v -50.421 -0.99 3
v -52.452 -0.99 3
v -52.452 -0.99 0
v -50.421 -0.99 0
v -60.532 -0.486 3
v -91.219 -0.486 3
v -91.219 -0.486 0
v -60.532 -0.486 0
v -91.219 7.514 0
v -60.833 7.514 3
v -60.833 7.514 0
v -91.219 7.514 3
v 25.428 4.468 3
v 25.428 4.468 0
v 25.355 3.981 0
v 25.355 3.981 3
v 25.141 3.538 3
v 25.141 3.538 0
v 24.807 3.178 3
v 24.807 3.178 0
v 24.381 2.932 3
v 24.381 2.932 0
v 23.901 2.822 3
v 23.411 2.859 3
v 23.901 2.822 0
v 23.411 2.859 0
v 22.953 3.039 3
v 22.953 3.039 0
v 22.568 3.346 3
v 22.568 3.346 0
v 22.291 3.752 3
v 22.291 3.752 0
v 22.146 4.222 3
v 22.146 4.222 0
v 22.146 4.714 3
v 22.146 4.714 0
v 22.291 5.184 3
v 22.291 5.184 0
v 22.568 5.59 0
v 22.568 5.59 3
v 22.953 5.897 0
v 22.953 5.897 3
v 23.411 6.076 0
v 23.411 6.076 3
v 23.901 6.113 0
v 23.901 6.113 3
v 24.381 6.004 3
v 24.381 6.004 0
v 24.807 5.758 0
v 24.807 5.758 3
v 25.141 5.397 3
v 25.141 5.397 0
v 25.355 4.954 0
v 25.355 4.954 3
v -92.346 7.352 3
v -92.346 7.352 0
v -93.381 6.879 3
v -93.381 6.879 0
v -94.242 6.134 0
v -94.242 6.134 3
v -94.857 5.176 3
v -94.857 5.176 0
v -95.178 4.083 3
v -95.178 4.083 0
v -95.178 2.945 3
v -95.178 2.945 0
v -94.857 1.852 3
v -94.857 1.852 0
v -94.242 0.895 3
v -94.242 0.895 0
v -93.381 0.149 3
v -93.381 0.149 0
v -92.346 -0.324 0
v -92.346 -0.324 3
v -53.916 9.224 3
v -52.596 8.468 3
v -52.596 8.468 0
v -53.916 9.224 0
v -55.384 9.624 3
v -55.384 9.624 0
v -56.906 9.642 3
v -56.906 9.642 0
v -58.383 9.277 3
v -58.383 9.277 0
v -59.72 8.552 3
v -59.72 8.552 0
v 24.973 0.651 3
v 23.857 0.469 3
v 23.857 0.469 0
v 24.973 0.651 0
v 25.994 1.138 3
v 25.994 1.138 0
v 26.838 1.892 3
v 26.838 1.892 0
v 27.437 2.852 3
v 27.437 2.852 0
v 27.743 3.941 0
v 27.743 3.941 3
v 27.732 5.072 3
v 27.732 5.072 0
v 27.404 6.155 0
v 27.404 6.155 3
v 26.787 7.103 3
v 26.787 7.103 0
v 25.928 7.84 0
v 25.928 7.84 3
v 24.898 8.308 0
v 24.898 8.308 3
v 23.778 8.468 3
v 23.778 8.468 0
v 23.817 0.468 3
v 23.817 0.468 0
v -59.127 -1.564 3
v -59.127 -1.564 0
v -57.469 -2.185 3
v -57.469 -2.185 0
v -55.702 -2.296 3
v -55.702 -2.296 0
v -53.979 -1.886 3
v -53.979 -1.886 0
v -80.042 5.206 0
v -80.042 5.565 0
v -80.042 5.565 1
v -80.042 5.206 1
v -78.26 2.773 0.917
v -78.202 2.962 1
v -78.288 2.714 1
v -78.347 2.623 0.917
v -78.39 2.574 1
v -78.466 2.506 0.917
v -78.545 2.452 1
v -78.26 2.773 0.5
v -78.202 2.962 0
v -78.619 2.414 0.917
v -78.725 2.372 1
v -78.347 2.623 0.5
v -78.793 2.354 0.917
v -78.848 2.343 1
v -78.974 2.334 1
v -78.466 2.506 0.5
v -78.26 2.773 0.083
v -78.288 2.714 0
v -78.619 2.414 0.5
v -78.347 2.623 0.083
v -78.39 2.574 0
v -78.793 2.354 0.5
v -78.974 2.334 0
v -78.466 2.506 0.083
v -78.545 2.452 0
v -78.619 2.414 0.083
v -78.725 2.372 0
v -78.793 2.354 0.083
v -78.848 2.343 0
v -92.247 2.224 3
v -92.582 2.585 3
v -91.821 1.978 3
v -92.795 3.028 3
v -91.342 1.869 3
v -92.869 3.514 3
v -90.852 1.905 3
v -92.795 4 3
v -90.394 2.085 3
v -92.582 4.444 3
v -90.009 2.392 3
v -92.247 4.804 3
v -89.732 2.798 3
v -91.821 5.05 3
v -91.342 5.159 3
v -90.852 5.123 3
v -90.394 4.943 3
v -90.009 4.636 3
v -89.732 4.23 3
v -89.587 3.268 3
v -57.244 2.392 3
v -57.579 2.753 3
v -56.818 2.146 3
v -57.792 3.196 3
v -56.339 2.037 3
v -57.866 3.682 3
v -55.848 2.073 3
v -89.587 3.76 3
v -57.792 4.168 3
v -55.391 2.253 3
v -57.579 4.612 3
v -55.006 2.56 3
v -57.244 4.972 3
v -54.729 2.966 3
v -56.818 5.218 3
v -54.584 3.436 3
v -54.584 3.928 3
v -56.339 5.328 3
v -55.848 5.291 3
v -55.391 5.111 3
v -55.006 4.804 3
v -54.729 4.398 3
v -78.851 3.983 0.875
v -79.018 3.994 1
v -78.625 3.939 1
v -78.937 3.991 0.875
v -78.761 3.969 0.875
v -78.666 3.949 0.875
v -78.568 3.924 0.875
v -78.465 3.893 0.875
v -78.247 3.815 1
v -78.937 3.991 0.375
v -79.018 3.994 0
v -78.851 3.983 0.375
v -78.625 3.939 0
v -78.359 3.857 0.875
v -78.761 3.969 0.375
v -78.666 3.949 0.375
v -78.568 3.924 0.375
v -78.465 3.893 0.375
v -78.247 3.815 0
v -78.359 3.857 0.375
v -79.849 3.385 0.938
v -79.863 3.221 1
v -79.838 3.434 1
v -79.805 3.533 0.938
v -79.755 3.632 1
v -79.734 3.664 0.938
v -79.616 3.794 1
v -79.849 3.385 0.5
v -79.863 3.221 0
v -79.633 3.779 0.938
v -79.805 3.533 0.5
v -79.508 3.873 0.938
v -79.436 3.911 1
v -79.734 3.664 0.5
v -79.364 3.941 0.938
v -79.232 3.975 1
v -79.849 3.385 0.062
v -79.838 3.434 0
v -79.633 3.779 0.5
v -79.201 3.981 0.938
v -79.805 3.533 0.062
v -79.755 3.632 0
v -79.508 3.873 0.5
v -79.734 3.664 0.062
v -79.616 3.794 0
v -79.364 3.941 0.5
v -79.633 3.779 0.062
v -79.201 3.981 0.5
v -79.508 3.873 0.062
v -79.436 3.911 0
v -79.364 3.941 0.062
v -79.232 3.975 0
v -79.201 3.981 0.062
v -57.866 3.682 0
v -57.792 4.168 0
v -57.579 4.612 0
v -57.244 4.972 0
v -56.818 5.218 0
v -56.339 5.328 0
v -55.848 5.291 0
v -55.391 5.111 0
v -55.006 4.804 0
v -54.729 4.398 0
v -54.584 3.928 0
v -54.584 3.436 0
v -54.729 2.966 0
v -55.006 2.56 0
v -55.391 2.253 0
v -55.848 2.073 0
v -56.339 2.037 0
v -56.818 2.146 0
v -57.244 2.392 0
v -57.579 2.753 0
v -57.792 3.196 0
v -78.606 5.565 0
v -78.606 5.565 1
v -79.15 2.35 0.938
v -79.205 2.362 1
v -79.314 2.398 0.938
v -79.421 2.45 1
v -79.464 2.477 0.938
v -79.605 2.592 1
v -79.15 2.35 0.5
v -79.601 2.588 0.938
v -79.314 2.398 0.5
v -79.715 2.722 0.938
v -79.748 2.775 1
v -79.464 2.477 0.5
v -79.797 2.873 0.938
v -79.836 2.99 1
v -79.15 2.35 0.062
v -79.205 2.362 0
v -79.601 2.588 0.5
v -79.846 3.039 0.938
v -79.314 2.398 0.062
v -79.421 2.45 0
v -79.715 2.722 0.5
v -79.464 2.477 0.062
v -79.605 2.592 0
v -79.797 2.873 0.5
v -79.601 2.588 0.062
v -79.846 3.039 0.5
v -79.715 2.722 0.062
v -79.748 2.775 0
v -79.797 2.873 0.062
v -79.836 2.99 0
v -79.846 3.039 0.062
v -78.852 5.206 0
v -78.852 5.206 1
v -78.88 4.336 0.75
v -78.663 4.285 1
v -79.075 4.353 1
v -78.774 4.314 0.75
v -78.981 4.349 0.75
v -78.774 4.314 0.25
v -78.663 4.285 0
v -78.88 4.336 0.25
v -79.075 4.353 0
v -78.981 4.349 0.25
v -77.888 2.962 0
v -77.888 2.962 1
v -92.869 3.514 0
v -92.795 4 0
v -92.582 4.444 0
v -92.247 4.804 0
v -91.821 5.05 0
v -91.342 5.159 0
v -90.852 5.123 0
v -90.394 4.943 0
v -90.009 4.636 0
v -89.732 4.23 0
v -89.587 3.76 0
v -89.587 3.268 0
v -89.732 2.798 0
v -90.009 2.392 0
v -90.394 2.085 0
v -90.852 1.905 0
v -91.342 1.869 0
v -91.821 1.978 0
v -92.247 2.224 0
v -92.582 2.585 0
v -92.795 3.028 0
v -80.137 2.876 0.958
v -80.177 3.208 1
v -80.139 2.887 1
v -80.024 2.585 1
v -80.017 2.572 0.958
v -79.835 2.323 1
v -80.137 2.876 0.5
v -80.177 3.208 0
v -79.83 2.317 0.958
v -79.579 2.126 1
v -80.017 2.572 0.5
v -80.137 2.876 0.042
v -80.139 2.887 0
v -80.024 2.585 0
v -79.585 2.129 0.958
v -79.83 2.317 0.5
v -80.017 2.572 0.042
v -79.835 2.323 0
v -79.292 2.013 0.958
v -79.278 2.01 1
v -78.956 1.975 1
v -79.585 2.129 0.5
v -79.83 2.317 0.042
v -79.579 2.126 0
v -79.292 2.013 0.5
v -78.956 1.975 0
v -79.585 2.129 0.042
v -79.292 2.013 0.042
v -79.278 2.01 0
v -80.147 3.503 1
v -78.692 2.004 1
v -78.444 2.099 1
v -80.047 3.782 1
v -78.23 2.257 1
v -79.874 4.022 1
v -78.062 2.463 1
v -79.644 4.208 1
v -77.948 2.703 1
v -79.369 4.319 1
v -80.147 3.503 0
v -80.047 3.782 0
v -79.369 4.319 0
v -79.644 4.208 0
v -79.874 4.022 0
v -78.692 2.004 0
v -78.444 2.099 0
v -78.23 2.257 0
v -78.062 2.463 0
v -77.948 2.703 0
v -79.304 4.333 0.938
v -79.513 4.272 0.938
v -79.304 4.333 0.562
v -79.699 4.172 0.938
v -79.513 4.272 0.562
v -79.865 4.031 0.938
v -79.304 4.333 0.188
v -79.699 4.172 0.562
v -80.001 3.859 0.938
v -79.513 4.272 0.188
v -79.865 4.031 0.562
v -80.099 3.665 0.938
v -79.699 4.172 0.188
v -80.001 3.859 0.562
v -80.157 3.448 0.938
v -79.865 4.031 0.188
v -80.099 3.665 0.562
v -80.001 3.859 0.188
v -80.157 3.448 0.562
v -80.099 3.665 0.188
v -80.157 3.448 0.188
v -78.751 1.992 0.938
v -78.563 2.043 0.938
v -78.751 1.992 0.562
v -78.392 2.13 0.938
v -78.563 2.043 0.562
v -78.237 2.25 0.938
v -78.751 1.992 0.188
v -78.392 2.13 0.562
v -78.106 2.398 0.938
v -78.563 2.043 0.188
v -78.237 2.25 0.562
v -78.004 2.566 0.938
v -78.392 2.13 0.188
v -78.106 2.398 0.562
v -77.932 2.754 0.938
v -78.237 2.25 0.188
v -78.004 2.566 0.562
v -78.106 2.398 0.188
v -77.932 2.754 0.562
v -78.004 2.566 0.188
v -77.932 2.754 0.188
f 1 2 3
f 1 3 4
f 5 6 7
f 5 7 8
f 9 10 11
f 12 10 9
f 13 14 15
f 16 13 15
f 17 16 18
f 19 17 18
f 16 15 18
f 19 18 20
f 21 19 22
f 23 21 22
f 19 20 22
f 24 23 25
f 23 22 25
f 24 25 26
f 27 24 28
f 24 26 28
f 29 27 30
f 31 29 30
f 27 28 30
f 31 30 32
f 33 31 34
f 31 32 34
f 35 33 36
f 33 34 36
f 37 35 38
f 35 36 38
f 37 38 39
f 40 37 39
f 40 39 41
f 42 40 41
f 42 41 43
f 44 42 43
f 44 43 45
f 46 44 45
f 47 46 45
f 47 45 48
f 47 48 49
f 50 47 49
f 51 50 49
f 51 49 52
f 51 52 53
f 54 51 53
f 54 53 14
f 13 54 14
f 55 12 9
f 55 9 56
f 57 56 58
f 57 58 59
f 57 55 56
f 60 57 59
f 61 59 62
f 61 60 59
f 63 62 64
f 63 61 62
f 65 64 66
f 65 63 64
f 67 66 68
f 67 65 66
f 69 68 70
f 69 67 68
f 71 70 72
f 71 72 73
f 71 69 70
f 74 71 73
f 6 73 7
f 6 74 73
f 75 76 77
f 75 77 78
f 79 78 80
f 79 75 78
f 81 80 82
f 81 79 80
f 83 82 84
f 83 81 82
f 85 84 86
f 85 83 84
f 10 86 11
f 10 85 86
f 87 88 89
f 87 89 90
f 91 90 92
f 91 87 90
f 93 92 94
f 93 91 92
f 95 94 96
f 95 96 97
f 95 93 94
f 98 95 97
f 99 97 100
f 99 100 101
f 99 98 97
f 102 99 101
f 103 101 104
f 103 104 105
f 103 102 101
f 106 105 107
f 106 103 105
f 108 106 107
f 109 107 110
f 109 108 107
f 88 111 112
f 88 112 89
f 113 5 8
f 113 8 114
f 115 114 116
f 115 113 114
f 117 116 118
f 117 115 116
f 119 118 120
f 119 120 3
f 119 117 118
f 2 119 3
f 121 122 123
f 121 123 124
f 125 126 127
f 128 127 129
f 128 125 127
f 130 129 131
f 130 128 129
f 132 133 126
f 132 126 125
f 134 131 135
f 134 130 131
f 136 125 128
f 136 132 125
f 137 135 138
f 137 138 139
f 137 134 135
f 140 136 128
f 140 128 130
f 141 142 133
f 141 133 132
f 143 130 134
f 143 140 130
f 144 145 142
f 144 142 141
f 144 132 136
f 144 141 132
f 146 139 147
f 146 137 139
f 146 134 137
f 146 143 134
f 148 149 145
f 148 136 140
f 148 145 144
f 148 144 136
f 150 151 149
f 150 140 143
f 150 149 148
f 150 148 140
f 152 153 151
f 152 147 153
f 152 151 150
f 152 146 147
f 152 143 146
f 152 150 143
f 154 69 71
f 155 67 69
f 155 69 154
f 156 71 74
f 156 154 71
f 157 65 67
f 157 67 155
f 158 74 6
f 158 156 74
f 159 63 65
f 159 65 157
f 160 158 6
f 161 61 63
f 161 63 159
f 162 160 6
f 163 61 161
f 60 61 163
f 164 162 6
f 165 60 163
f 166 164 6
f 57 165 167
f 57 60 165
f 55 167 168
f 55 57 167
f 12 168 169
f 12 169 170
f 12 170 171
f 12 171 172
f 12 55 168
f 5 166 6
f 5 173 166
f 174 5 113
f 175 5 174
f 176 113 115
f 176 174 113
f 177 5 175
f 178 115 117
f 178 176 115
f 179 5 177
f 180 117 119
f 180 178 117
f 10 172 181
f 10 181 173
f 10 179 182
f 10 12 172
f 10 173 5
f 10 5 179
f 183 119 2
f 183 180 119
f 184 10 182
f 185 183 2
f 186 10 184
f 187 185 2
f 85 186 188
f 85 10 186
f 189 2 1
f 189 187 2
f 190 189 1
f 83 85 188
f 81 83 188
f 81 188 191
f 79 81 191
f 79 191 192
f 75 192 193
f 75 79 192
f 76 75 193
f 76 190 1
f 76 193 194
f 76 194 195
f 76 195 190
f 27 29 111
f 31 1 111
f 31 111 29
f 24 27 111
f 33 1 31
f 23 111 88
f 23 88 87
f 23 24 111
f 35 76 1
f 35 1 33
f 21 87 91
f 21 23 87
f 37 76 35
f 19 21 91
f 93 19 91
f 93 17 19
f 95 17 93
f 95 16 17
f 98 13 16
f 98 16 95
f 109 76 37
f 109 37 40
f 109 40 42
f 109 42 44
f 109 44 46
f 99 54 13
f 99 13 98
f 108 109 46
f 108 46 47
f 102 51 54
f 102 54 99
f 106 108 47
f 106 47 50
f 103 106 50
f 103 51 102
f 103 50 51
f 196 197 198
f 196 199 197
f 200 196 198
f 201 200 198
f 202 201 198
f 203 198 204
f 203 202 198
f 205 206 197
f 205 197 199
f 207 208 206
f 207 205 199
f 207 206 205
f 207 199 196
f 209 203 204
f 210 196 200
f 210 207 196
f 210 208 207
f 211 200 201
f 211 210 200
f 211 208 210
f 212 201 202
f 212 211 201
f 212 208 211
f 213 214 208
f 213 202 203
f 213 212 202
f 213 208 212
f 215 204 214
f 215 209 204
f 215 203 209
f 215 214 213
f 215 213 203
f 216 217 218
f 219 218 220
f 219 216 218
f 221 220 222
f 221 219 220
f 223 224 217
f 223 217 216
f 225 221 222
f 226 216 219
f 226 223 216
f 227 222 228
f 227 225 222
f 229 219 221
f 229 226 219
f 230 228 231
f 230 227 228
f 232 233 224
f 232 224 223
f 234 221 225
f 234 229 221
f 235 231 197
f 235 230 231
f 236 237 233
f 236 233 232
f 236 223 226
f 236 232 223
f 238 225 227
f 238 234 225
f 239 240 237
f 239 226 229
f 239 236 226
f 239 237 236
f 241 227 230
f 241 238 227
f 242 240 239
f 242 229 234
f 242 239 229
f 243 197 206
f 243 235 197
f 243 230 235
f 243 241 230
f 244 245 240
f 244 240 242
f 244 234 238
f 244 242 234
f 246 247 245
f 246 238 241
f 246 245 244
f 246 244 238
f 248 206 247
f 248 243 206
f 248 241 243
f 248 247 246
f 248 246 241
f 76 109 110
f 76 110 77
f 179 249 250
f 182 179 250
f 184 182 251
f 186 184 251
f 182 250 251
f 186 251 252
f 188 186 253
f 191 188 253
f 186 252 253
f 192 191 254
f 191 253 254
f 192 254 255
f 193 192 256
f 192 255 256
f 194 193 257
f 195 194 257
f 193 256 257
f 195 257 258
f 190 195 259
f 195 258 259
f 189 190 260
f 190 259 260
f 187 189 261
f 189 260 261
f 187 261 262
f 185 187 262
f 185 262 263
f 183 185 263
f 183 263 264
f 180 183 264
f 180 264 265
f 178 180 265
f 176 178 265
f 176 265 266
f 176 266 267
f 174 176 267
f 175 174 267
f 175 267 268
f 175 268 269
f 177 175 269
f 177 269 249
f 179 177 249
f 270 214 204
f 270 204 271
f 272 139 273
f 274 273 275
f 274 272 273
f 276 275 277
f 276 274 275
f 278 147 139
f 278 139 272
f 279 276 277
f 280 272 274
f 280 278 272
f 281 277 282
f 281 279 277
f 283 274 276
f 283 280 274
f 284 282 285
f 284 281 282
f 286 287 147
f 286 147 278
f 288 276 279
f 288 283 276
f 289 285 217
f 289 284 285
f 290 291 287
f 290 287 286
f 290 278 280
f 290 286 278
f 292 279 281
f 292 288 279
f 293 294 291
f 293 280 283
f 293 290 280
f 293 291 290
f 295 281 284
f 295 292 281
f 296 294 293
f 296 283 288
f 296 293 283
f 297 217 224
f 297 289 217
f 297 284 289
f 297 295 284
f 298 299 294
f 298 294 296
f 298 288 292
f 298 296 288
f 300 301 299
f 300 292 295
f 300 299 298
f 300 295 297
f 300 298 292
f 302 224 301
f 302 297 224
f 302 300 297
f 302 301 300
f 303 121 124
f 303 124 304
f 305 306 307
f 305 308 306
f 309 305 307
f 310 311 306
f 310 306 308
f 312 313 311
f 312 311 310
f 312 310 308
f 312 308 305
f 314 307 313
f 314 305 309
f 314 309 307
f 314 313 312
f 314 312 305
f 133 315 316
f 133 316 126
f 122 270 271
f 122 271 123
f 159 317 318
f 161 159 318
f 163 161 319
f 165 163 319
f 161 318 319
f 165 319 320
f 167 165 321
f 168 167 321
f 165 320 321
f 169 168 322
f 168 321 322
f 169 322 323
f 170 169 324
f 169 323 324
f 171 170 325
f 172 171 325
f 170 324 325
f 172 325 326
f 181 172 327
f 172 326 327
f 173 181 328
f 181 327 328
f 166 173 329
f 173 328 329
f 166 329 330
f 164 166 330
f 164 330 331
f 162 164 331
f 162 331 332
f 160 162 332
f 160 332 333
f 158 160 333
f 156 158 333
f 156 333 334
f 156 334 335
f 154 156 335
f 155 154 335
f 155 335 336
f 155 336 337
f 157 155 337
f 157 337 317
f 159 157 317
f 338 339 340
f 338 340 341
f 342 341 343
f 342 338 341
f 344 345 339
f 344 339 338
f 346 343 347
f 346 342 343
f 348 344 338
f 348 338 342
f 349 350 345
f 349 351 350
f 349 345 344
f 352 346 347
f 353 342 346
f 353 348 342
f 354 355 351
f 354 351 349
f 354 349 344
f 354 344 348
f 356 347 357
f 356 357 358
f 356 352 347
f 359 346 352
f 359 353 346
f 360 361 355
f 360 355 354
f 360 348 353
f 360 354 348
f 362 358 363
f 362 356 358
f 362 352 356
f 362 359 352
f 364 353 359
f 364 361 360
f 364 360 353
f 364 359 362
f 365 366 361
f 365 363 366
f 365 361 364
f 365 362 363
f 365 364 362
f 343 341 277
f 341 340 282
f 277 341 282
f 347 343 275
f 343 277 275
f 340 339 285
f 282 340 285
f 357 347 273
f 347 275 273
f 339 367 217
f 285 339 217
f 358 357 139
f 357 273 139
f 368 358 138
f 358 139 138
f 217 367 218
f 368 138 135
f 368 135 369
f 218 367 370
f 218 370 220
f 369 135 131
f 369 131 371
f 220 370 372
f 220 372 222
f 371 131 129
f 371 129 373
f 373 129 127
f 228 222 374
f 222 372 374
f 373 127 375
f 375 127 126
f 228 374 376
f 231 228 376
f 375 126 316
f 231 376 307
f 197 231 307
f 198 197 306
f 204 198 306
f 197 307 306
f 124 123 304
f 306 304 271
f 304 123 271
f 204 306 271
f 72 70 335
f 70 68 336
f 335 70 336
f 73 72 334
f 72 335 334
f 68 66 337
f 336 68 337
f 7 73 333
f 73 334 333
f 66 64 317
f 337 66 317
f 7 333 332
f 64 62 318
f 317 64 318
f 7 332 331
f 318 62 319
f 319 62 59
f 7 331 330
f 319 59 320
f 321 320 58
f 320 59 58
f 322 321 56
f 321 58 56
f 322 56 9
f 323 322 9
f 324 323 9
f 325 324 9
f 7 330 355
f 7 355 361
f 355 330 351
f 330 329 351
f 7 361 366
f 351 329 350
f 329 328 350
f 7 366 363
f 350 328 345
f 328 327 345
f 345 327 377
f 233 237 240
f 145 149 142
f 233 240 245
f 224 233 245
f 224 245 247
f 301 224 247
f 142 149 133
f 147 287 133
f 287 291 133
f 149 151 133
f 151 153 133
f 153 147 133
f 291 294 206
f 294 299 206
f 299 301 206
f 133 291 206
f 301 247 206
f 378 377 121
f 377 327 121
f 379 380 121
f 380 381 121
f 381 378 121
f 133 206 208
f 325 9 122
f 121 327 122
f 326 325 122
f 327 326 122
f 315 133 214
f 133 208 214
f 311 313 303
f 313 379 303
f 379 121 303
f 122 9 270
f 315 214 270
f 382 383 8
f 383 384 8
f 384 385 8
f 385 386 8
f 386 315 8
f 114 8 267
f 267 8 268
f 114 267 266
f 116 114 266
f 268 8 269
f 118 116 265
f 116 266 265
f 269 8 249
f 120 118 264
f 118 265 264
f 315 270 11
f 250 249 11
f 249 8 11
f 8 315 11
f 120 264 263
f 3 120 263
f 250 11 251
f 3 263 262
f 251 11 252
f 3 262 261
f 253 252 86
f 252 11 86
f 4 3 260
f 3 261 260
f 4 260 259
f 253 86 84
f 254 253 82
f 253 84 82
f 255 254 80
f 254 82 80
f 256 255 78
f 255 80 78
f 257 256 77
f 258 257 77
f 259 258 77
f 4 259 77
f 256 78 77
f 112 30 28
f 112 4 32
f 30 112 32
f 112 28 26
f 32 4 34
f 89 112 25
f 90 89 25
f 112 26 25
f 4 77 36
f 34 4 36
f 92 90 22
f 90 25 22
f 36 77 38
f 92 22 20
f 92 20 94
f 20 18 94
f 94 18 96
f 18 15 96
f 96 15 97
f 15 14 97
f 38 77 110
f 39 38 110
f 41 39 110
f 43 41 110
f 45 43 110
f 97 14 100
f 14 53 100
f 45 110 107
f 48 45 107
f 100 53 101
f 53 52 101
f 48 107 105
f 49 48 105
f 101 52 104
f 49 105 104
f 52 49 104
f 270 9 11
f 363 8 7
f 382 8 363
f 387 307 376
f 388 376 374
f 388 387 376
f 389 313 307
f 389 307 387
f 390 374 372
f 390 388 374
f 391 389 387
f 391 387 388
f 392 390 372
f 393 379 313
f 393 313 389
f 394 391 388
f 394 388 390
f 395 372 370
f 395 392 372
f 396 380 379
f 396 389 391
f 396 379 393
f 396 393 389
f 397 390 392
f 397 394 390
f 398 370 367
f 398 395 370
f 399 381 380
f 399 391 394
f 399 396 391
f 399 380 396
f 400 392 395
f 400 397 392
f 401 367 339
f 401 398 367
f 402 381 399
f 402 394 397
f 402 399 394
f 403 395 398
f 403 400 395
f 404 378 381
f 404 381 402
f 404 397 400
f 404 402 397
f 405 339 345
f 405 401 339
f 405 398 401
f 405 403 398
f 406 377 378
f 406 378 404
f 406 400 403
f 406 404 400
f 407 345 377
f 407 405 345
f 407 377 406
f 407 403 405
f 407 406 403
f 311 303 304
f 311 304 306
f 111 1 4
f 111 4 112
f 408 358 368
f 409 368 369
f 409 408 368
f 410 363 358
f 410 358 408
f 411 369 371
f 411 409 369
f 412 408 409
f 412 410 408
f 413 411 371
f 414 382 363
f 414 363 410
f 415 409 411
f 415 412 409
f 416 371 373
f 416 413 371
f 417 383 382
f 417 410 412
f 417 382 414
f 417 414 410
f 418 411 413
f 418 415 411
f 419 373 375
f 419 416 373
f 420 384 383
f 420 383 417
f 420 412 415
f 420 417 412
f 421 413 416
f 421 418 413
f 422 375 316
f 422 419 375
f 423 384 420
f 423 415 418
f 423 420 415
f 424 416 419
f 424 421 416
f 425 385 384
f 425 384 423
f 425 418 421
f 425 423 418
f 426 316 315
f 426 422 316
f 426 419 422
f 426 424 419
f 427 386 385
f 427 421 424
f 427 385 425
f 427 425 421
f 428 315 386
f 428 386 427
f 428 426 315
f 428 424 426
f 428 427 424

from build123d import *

# Parameters (mm, degrees)
EXTRUDE_1_DEPTH     = 3
SKETCH_2_R          = 1.35
CUT_EXTRUDE_1_DEPTH = 2.444444444
SKETCH_3_R          = 1.65
CUT_EXTRUDE_3_DEPTH = 96.756657889
CUT_EXTRUDE_4_DEPTH = 1


with BuildPart() as part:
    # 草图1 → 凸台-拉伸1 (new body)
    with BuildSketch(Plane.XY.offset(3)):
        with BuildLine():
            Line((-60.832535173, 7.514094179), (-91.218664305, 7.514094179))
            ThreePointArc((-91.218664305, 7.514094179), (-95.218664305, 3.514094179), (-91.218664305, -0.485905821))
            Line((-91.218664305, -0.485905821), (-60.531573746, -0.485905821))
            ThreePointArc((-60.531573746, -0.485905821), (-56.589491156, -2.306217172), (-52.451603626, -0.990377005))
            Line((-52.451603626, -0.990377005), (-50.420982545, -0.990377005))
            Line((-50.420982545, -0.990377005), (23.816560918, 0.467808699))
            Line((23.816560918, 0.467808699), (23.856567982, 0.468594524))
            ThreePointArc((23.856567982, 0.468594524), (27.777723532, 4.507000717), (23.778016459, 8.467622986))
            Line((23.778016459, 8.467622986), (-52.596358319, 8.467622986))
            ThreePointArc((-52.596358319, 8.467622986), (-56.905640848, 9.642312032), (-60.832535173, 7.514094179))
        make_face()
    extrude(amount=-EXTRUDE_1_DEPTH)

    # 草图2 → 切除-拉伸1 (cut)
    with BuildSketch(Plane.XY.offset(3)):
        with Locations(Location((23.77801746, 4.467622995, 0), (0, 0, 180))):
            Circle(SKETCH_2_R)
    extrude(amount=-CUT_EXTRUDE_1_DEPTH, mode=Mode.SUBTRACT)

    # 草图3 → 切除-拉伸3 (cut, through all)
    with BuildSketch(Plane(origin=(0, 0, 0), x_dir=(-1, 0, 0), z_dir=(0, 0, -1))):
        with Locations(Location((-23.778017455, 4.467823177, 0), (0, 0, 180))):
            Circle(SKETCH_3_R)
        with Locations((56.215610459, 3.6821226)):
            Circle(SKETCH_3_R)
        with Locations((91.218664305, 3.514094179)):
            Circle(SKETCH_3_R)
    extrude(amount=-CUT_EXTRUDE_3_DEPTH, mode=Mode.SUBTRACT)

    # 草图4 → 切除-拉伸4 (cut)
    with BuildSketch(Plane(origin=(0, 0, 0), x_dir=(-1, 0, 0), z_dir=(0, 0, -1))):
        with BuildLine():
            Line((80.04205053, 5.564500073), (80.04205053, 5.205525714))
            Line((80.04205053, 5.205525714), (78.851545722, 5.205525714))
            Line((78.851545722, 5.205525714), (78.662943959, 4.284952797))
            add(Edge.make_bspline(
                [(78.662943959, 4.284952797), (78.699999834, 4.295183069), (78.77178973, 4.315002603), (78.877749591, 4.337008373), (78.978341794, 4.350273817), (79.043617164, 4.352085128), (79.075203575, 4.352961612)],
                knots=[0, 0, 0, 0, 1.100273476, 2.13160584, 3.095893838, 4, 4, 4, 4], degree=3))
            add(Edge.make_bspline(
                [(79.075203575, 4.352961612), (79.114287314, 4.352115676), (79.191135712, 4.350452355), (79.303574659, 4.334480505), (79.410907552, 4.309340591), (79.512909922, 4.274220069), (79.609770473, 4.229310336), (79.700598034, 4.173210396), (79.786755947, 4.107677064), (79.866698541, 4.032332052), (79.939222849, 3.949410436), (80.002988839, 3.860252565), (80.057151429, 3.765724903), (80.100712184, 3.664924294), (80.135496519, 3.55896514), (80.158648513, 3.446732558), (80.174065222, 3.329284438), (80.175787609, 3.248979868), (80.176665915, 3.208029721)],
                knots=[0, 0, 0, 0, 1.052922333, 2.070308379, 3.05430497, 4.020497103, 4.973039431, 5.925935799, 6.892292201, 7.88610001, 8.88166317, 9.857072816, 10.836096531, 11.812156883, 12.81219415, 13.836441305, 14.89672472, 16, 16, 16, 16], degree=3))
            add(Edge.make_bspline(
                [(80.176665915, 3.208029721), (80.176000839, 3.1795075), (80.174679677, 3.122848513), (80.167961089, 3.038704312), (80.155025373, 2.956341479), (80.137657649, 2.875749087), (80.115115231, 2.797079715), (80.087826177, 2.720108187), (80.054430149, 2.64531358), (80.017798774, 2.571988185), (79.976552296, 2.501789678), (79.930773789, 2.436140691), (79.882408298, 2.37405641), (79.830366912, 2.316202677), (79.774165917, 2.262959659), (79.71448595, 2.214011377), (79.651803231, 2.168530047), (79.585147989, 2.128361852), (79.516005506, 2.091398896), (79.443377289, 2.061075359), (79.368916588, 2.03396483), (79.291551713, 2.012355303), (79.2114579, 1.995422748), (79.128503125, 1.983922148), (79.043122455, 1.97554571), (78.985247442, 1.975021353), (78.95601287, 1.974756483)],
                knots=[0, 0, 0, 0, 1.056347294, 2.098418968, 3.122841568, 4.141288669, 5.149314143, 6.15115421, 7.162517403, 8.180376062, 9.185164535, 10.17417709, 11.141909838, 12.097768115, 13.052685741, 14.0056014, 14.954263652, 15.917497458, 16.885230207, 17.854509472, 18.828990115, 19.81800267, 20.826176721, 21.857883937, 22.917946725, 24, 24, 24, 24], degree=3))
            add(Edge.make_bspline(
                [(78.95601287, 1.974756483), (78.921138689, 1.975447321), (78.852527858, 1.976806463), (78.752007291, 1.991024949), (78.655292685, 2.011388865), (78.563162584, 2.042025135), (78.474791321, 2.08041243), (78.391368603, 2.128928601), (78.310762827, 2.183907705), (78.23625079, 2.248788058), (78.167094677, 2.31970374), (78.105188168, 2.396661381), (78.050054591, 2.478390823), (78.002576844, 2.565288977), (77.962078823, 2.657127508), (77.930263834, 2.754250509), (77.904585479, 2.856150513), (77.893722059, 2.926304023), (77.888204376, 2.961935971)],
                knots=[0, 0, 0, 0, 1.0467383, 2.05933395, 3.04377827, 4.011590433, 4.970194871, 5.932262533, 6.905835911, 7.896367577, 8.894135286, 9.877477877, 10.858688626, 11.851381753, 12.8477658, 13.868841284, 14.917554742, 16, 16, 16, 16], degree=3))
            Line((77.888204376, 2.961935971), (78.20230694, 2.961935971))
            add(Edge.make_bspline(
                [(78.20230694, 2.961935971), (78.210035498, 2.928559518), (78.224890214, 2.864408123), (78.257495963, 2.774276782), (78.297361838, 2.693957558), (78.344766187, 2.622387975), (78.401316217, 2.559978978), (78.465845646, 2.504361916), (78.538193369, 2.454186786), (78.618586599, 2.412364019), (78.703399678, 2.376695266), (78.792166888, 2.352943571), (78.882471235, 2.336242678), (78.943549605, 2.334570917), (78.974242036, 2.333730842)],
                knots=[0, 0, 0, 0, 1.136247022, 2.183929868, 3.172523383, 4.106158343, 5.02341133, 5.958108904, 6.928429099, 7.938127109, 8.96079061, 9.975095812, 10.982467395, 12, 12, 12, 12], degree=3))
            add(Edge.make_bspline(
                [(78.974242036, 2.333730842), (79.004200481, 2.33455162), (79.063188903, 2.336167739), (79.15000029, 2.348606751), (79.233813164, 2.367764322), (79.313800521, 2.396434177), (79.39136206, 2.431278895), (79.464535831, 2.475993971), (79.535438708, 2.52745399), (79.601866841, 2.58641062), (79.662706291, 2.651380314), (79.716462412, 2.720857708), (79.761239325, 2.794974554), (79.798973434, 2.872447707), (79.827626733, 2.954126264), (79.848067714, 3.03962744), (79.860070773, 3.12916242), (79.861721953, 3.19023173), (79.86256335, 3.221351035)],
                knots=[0, 0, 0, 0, 1.027316725, 2.022795036, 3.002884548, 3.971462791, 4.93288096, 5.914575861, 6.907176829, 7.935150275, 8.956128384, 9.956726525, 10.942570165, 11.921478529, 12.907843606, 13.90538589, 14.932640048, 16, 16, 16, 16], degree=3))
            add(Edge.make_bspline(
                [(79.86256335, 3.221351035), (79.861904871, 3.249426786), (79.860615991, 3.304381075), (79.850085421, 3.384780282), (79.831768448, 3.460853324), (79.806344569, 3.532967558), (79.774065061, 3.601191), (79.734618748, 3.665594061), (79.687265351, 3.725327894), (79.633173462, 3.780420447), (79.573915421, 3.831265322), (79.508471678, 3.874609409), (79.438211752, 3.911073326), (79.363982152, 3.942541325), (79.284017254, 3.96514207), (79.199900621, 3.982109956), (79.110723913, 3.991925318), (79.049753225, 3.993287207), (79.018412709, 3.993987253)],
                knots=[0, 0, 0, 0, 1.045622112, 2.046656509, 3.013763289, 3.955457236, 4.890082067, 5.820317437, 6.762574623, 7.722996705, 8.69280354, 9.665887285, 10.63943826, 11.638615906, 12.663482002, 13.728887084, 14.832589034, 16, 16, 16, 16], degree=3))
            add(Edge.make_bspline(
                [(79.018412709, 3.993987253), (78.991283781, 3.993406661), (78.935269425, 3.992207888), (78.849346599, 3.983381391), (78.759054876, 3.969142097), (78.66474038, 3.949555849), (78.566119872, 3.923924772), (78.463401471, 3.893210272), (78.356369205, 3.856488273), (78.28425148, 3.828756059), (78.247178735, 3.814500073)],
                knots=[0, 0, 0, 0, 0.817624296, 1.688186739, 2.600797293, 3.572016777, 4.590301741, 5.671205678, 6.80286297, 8, 8, 8, 8], degree=3))
            Line((78.247178735, 3.814500073), (78.606153094, 5.564500073))
            Line((78.606153094, 5.564500073), (80.04205053, 5.564500073))
        make_face()
    extrude(amount=-CUT_EXTRUDE_4_DEPTH, mode=Mode.SUBTRACT)


solid = part.part
